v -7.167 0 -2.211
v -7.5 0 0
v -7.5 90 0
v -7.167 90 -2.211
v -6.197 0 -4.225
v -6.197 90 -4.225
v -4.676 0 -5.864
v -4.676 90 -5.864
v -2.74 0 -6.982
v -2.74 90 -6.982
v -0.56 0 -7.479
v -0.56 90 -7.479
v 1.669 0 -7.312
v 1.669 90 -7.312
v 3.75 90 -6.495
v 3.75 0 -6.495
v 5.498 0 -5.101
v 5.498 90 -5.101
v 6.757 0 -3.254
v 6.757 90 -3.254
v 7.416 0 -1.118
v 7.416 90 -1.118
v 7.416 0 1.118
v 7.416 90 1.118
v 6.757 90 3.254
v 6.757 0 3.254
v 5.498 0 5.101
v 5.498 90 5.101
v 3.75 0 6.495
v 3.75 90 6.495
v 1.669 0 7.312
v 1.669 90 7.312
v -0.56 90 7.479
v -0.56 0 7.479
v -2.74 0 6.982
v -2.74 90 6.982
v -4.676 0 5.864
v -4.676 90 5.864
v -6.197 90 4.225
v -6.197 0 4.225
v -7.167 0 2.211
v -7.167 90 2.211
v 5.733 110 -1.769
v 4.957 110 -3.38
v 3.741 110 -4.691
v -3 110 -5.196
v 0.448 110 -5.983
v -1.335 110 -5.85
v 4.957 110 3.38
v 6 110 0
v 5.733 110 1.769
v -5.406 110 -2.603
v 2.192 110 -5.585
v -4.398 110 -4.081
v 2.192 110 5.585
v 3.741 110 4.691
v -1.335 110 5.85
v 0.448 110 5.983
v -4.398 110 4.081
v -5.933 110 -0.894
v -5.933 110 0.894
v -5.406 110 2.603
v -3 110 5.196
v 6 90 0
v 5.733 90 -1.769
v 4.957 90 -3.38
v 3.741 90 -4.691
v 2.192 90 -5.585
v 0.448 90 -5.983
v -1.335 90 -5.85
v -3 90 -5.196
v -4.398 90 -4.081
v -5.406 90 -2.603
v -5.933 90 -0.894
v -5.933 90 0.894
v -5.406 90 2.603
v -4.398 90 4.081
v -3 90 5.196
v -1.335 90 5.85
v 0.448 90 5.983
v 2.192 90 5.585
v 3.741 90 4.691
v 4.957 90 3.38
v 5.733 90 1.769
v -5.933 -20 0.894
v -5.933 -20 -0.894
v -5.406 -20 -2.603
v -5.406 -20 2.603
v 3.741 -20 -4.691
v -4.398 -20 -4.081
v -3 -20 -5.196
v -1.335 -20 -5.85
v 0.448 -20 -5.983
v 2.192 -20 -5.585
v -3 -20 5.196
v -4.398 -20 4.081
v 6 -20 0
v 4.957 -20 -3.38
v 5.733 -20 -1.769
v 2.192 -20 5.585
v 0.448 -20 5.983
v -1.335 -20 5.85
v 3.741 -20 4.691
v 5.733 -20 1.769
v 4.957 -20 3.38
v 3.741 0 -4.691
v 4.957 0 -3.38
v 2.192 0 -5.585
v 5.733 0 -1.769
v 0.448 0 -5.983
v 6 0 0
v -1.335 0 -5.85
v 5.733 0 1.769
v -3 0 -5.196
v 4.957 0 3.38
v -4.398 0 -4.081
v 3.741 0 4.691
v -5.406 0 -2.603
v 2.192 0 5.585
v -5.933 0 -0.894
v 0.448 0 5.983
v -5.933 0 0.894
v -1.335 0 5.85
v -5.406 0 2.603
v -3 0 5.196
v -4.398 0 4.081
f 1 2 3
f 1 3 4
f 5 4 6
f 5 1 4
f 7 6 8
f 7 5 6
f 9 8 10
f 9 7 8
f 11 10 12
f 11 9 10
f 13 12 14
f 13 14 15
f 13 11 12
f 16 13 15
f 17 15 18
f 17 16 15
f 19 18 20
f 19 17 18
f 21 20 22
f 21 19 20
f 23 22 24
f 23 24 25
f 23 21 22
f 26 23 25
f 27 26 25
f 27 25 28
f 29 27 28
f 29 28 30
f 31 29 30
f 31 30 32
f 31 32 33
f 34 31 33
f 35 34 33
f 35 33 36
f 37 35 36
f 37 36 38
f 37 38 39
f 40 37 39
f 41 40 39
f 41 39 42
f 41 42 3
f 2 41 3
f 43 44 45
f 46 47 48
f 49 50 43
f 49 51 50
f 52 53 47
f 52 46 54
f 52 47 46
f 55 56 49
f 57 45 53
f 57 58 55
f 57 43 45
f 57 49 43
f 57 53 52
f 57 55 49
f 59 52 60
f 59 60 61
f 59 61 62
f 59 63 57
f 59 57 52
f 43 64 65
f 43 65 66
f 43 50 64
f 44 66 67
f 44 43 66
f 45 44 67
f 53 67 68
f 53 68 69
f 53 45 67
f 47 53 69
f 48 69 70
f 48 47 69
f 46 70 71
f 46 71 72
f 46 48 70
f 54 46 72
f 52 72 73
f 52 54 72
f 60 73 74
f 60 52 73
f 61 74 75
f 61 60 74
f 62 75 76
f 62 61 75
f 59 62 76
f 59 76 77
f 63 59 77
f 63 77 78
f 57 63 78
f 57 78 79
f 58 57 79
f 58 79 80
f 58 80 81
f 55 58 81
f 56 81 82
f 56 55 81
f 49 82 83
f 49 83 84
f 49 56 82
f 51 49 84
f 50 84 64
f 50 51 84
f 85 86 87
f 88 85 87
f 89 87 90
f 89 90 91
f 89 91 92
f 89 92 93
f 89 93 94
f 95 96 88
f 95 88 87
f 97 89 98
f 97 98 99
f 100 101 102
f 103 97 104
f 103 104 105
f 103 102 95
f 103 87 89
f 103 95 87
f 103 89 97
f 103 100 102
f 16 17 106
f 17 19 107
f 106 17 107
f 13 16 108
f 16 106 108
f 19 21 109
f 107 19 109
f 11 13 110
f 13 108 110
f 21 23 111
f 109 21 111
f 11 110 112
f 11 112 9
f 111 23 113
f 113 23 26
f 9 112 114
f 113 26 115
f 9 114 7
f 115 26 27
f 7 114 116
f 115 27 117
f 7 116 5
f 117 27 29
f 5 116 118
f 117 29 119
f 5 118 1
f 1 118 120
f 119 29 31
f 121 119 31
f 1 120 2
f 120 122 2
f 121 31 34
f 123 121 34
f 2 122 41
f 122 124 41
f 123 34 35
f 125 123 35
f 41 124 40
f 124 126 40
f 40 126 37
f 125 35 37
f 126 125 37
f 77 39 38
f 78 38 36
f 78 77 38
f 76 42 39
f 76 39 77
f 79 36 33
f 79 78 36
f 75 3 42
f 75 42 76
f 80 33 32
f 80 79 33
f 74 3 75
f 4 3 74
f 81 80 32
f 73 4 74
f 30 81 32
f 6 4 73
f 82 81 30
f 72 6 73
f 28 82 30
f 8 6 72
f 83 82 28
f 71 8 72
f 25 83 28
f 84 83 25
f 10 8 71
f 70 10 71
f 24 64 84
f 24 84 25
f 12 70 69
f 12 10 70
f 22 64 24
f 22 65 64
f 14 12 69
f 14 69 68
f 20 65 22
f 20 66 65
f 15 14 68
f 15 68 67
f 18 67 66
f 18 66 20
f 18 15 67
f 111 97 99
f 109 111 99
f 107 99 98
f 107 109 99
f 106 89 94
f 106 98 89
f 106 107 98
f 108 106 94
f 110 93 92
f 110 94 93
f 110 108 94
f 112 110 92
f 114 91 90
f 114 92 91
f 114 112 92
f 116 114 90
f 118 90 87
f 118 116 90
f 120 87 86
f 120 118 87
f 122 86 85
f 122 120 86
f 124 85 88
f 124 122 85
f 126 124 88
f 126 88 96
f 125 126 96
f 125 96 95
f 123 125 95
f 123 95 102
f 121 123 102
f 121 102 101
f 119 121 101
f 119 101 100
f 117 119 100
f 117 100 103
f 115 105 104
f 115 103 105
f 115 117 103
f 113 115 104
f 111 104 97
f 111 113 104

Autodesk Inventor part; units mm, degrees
ref_plane "YZ Plane" through (0, 0, 0) normal (1, 0, 0) x (0, 1, 0)
ref_plane "XZ Plane" through (0, 0, 0) normal (0, 1, 0) x (-1, 0, 0)
ref_plane "XY Plane" through (0, 0, 0) normal (0, 0, 1) x (1, 0, 0)
sketch "スケッチ1" plane through (0, 0, 0) normal (0, 1, 0) x (-1, 0, 0)
  circle A0 centre (0, 0) radius 7.5
  dimension "d0" = 15
extrude "押し出し1" add sketch "スケッチ1" along normal blind 110
sketch "スケッチ2" plane through (0, 110, 0) normal (0, 1, 0) x (1, 0, 0)
  circle A0 centre (0, 0) radius 6
  circle A1 centre (0, 0) radius 8
  dimension "d3" = 12
extrude "押し出し2" cut sketch "スケッチ2" against normal blind 20
sketch "スケッチ3" plane through (0, 0, 0) normal (0, -1, 0) x (1, 0, 0)
  circle A0 centre (0, 0) radius 6
  dimension "d6" = 12
extrude "押し出し3" add sketch "スケッチ3" along normal blind 20
properties part number "shaft2016"
